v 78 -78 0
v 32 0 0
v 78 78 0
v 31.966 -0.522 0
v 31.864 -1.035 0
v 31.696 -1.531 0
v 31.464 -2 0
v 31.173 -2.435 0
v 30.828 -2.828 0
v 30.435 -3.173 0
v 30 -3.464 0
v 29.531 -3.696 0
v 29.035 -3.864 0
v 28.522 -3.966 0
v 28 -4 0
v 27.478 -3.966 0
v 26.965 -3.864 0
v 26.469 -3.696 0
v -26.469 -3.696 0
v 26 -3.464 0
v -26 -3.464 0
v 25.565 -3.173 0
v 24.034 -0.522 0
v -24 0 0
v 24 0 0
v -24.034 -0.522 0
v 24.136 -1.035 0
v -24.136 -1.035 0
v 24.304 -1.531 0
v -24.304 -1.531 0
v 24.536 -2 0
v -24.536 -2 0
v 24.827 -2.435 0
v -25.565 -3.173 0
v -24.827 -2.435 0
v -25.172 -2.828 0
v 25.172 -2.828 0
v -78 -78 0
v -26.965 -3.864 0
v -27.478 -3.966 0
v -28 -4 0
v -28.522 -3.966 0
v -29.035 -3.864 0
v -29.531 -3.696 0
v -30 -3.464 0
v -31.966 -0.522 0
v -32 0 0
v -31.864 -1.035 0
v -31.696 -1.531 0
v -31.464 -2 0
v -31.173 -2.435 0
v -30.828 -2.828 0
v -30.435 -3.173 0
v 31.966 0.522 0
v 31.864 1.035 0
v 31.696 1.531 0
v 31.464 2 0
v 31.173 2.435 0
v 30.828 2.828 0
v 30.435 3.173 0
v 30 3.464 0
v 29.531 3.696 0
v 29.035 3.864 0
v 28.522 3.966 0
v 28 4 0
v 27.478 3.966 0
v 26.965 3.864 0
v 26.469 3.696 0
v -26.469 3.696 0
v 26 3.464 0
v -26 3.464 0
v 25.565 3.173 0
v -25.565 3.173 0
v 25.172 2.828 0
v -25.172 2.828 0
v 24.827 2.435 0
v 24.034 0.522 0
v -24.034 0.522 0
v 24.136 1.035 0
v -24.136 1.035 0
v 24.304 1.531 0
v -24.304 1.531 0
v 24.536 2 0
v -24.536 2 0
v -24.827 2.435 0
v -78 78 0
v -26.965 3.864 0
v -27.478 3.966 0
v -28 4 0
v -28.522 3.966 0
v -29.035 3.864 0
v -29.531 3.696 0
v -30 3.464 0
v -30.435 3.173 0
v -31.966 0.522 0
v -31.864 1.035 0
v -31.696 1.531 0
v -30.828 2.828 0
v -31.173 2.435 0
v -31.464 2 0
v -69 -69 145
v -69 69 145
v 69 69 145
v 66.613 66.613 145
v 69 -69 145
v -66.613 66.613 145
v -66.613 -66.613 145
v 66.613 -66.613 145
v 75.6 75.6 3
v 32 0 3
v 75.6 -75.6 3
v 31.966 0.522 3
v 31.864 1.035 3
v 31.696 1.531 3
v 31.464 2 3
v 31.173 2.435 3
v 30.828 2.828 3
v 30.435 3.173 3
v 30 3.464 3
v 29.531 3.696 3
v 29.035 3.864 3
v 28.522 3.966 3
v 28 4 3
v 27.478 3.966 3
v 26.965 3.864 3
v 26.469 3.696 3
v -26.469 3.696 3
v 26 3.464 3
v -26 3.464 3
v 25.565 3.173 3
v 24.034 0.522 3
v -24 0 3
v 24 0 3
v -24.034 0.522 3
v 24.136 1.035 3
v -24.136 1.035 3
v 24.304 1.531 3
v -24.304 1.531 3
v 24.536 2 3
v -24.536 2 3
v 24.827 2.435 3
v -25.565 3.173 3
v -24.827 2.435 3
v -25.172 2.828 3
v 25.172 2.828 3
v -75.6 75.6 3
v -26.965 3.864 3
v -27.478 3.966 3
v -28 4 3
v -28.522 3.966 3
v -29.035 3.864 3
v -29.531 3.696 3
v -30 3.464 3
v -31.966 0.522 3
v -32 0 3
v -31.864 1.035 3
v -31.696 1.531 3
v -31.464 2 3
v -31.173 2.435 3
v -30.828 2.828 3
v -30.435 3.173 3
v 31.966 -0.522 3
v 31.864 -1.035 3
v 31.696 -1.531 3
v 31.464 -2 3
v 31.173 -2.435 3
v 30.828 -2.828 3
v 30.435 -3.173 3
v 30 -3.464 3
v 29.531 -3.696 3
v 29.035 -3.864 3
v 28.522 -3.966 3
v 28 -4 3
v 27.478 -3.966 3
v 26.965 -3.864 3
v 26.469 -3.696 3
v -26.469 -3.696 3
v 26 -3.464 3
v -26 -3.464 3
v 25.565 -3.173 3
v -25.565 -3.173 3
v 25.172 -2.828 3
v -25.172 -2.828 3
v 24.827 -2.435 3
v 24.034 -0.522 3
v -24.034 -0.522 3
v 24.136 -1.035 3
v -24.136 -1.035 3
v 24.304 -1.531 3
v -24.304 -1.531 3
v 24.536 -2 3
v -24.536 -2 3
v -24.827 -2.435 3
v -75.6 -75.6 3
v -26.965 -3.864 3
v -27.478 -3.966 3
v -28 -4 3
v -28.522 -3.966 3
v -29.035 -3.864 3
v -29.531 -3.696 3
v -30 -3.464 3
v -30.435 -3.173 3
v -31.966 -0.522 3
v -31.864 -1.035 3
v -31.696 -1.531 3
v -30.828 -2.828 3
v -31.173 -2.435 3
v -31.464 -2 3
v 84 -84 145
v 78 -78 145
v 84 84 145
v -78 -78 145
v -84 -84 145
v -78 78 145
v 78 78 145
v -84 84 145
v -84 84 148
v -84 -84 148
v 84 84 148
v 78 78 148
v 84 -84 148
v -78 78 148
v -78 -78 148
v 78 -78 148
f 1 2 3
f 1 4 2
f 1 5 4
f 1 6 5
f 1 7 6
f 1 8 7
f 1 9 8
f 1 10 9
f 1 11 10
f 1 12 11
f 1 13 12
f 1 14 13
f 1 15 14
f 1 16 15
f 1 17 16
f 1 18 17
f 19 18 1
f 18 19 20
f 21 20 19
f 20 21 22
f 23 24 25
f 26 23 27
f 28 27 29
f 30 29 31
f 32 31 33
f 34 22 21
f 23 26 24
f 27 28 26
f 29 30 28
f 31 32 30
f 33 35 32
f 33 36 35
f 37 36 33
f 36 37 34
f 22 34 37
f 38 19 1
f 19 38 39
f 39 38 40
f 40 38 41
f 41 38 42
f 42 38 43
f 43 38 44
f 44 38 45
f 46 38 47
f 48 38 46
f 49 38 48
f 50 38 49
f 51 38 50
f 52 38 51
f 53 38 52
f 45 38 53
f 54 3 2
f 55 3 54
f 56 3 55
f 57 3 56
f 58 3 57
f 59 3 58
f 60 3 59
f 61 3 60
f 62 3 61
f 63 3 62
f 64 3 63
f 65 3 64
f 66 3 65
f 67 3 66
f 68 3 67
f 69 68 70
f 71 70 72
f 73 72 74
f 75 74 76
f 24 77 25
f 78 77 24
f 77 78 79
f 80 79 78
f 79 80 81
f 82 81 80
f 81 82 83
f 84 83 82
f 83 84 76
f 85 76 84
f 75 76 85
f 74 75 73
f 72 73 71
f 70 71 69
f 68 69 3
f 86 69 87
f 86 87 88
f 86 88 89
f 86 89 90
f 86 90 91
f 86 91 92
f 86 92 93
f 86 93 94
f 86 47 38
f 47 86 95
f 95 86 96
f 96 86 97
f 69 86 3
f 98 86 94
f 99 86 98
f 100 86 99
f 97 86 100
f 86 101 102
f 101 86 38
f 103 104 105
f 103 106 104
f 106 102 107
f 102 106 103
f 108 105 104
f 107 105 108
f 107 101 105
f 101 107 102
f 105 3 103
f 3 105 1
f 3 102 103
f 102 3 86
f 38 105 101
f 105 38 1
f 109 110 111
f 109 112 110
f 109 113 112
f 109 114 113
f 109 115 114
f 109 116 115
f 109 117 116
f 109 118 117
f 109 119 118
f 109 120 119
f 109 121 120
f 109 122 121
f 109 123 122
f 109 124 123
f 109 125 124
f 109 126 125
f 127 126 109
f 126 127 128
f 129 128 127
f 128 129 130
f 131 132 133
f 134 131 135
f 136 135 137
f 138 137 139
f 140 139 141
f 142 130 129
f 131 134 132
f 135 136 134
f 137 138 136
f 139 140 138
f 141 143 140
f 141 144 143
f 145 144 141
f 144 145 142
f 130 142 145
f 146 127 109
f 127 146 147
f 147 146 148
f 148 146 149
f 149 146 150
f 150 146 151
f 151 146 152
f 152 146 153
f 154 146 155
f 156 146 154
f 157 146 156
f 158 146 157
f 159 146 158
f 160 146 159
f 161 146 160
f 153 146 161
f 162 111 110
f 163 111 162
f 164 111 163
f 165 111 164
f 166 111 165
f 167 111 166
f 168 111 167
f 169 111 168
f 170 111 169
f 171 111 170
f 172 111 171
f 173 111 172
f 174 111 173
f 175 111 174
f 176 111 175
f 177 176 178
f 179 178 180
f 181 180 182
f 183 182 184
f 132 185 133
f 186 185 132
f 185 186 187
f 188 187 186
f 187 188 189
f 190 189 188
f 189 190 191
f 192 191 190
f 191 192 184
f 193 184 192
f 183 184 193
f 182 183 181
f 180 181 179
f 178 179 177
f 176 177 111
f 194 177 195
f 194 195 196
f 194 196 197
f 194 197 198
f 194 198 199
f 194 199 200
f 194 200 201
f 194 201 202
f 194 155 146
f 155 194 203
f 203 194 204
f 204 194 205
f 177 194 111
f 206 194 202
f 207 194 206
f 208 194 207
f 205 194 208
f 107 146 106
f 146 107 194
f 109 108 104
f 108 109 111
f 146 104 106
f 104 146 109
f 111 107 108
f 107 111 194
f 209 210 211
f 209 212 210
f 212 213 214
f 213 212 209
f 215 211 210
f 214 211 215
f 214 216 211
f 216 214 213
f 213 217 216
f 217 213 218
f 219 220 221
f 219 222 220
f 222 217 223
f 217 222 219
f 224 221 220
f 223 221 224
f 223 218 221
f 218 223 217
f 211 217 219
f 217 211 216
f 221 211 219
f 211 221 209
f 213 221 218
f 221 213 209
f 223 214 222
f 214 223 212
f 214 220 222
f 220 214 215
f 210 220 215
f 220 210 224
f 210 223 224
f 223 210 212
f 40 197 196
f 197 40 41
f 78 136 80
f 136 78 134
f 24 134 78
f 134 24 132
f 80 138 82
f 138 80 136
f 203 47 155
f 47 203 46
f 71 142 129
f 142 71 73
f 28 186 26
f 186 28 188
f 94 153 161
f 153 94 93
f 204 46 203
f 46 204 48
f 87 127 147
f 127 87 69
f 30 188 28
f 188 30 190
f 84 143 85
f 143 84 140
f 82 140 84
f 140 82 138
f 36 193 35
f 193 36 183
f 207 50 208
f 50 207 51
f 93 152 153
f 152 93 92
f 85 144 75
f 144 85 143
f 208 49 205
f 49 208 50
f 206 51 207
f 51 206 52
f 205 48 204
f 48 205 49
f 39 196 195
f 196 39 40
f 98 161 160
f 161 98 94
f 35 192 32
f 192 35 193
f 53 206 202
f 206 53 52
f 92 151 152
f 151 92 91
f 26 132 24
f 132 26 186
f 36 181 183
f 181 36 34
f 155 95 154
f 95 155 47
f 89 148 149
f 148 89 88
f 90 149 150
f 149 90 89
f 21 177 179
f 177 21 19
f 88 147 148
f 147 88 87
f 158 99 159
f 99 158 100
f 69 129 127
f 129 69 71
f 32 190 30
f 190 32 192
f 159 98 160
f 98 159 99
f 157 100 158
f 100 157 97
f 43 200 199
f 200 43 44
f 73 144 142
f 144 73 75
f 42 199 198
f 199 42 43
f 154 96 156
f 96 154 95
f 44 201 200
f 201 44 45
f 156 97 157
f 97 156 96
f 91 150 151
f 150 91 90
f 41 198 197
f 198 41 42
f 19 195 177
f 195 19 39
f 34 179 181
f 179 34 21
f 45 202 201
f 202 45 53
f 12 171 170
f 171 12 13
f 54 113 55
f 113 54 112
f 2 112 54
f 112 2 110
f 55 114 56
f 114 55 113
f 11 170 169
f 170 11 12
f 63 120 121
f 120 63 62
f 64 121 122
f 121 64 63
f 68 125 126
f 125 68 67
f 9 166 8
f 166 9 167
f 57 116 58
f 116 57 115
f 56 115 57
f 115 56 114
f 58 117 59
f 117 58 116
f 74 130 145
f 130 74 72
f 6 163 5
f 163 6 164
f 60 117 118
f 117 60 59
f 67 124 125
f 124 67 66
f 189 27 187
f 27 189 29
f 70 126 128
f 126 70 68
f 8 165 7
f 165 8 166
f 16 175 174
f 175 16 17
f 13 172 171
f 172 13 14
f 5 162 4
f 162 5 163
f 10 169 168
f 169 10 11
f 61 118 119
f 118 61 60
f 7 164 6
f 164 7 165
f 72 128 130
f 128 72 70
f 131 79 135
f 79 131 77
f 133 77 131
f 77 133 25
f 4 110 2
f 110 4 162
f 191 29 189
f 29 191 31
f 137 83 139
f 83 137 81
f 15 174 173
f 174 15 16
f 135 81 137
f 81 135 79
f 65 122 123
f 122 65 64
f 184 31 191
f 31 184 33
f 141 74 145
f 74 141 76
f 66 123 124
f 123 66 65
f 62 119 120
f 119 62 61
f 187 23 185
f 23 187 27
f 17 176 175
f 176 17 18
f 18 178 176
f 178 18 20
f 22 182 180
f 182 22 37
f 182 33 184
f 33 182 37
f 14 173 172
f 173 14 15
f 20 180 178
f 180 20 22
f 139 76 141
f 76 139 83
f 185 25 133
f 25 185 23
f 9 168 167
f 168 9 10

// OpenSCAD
// file: ../lib/common.scad
// ===================================
// OpenGarden common helpers
// ===================================

module centered_cylinder(d, h) {
    cylinder(d = d, h = h, center = true);
}

module centered_cube(size = [10,10,10]) {
    cube(size, center = true);
}

// Tapered rectangular shell
// Outer shape is defined by top/bottom sizes.
// Inner subtraction uses the same taper logic.
// Small Z offsets are used to avoid coplanar boolean issues.
module tapered_box_shell(
    top = [156,156],
    bottom = [138,138],
    height = 145,
    wall = 2.4,
    bottom_thick = 3
) {
    difference() {
        linear_extrude(
            height = height,
            scale = [bottom[0] / top[0], bottom[1] / top[1]]
        )
        square(top, center = true);

        translate([0, 0, bottom_thick])
        linear_extrude(
            height = height - bottom_thick + 0.2,
            scale = [
                (bottom[0] - 2 * wall) / (top[0] - 2 * wall),
                (bottom[1] - 2 * wall) / (top[1] - 2 * wall)
            ]
        )
        square(
            [top[0] - 2 * wall, top[1] - 2 * wall],
            center = true
        );
    }
}
// file: ../params/mvp_params.scad
// ===================================
// OpenGarden MVP Parameters
// Carrier + Insert architecture
// ===================================

// ---------- Pot Insert ----------
insert_top_width        = 156;
insert_top_depth        = 156;
insert_bottom_width     = 138;
insert_bottom_depth     = 138;
insert_height           = 145;

insert_wall_thickness   = 2.4;
insert_bottom_thickness = 3.0;

// Top seating flange
insert_flange_width     = 6;
insert_flange_thickness = 3;

// Drainage
drain_hole_diameter     = 8;
drain_hole_offset_x     = 28;
drain_hole_offset_y     = 0;

// Carrier
carrier_outer_width     = 176;
carrier_outer_depth     = 176;
carrier_height          = 160;

carrier_wall_thickness  = 4;
carrier_back_thickness  = 5;
carrier_ledge_width     = 8;
carrier_ledge_height    = 12;

// Sensor
sensor_probe_width      = 14;
sensor_probe_thickness  = 6;
sensor_probe_length     = 70;

sensor_holder_width     = 22;
sensor_holder_thickness = 3;
sensor_holder_height    = 28;
sensor_insert_depth     = 60;

// Tube
tube_outer_diameter     = 6.0;
tube_clip_wall          = 2.4;
tube_clip_width         = 16;
tube_drop_inset         = 18;

// Electronics
electronics_plate_width  = 110;
electronics_plate_height = 140;
electronics_plate_thick  = 4;

// General print
clearance_loose         = 0.4;
clearance_tight         = 0.2;
$fn = 48;
// main file
include <../params/mvp_params.scad>
use <../lib/common.scad>

// ===================================
// Pot Insert
// Removable growing container
// ===================================

module insert_drain_holes() {
    for (xsign = [-1, 1]) {
        translate([
            xsign * drain_hole_offset_x,
            drain_hole_offset_y,
            -0.5
        ])
        cylinder(d = drain_hole_diameter, h = insert_bottom_thickness + 2);
    }
}

module insert_flange() {
    difference() {
        translate([0, 0, insert_height])
            linear_extrude(height = insert_flange_thickness)
                square(
                    [
                        insert_top_width + 2 * insert_flange_width,
                        insert_top_depth + 2 * insert_flange_width
                    ],
                    center = true
                );

        translate([0, 0, insert_height - 0.1])
            linear_extrude(height = insert_flange_thickness + 0.2)
                square(
                    [insert_top_width, insert_top_depth],
                    center = true
                );
    }
}

module pot_insert(include_flange = true) {
    difference() {
        union() {
            tapered_box_shell(
                top = [insert_top_width, insert_top_depth],
                bottom = [insert_bottom_width, insert_bottom_depth],
                height = insert_height,
                wall = insert_wall_thickness,
                bottom_thick = insert_bottom_thickness
            );

            if (include_flange)
                insert_flange();
        }

        insert_drain_holes();
    }
}

pot_insert();
